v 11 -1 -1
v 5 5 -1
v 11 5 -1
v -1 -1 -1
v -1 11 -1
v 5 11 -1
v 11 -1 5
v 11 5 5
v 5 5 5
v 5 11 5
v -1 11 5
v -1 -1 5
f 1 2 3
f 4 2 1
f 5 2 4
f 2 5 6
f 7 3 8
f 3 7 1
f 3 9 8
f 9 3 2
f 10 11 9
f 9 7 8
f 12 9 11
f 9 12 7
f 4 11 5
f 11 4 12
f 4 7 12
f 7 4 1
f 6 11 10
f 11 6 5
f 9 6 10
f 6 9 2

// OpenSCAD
// A concave shape built as a union of two convex boxes, rounded by a cube.
// Minkowski distributes over the union, so this is exact (not the convex hull).
minkowski() { union() { cube([10,4,4]); cube([4,10,4]); } cube(2, center=true); }
